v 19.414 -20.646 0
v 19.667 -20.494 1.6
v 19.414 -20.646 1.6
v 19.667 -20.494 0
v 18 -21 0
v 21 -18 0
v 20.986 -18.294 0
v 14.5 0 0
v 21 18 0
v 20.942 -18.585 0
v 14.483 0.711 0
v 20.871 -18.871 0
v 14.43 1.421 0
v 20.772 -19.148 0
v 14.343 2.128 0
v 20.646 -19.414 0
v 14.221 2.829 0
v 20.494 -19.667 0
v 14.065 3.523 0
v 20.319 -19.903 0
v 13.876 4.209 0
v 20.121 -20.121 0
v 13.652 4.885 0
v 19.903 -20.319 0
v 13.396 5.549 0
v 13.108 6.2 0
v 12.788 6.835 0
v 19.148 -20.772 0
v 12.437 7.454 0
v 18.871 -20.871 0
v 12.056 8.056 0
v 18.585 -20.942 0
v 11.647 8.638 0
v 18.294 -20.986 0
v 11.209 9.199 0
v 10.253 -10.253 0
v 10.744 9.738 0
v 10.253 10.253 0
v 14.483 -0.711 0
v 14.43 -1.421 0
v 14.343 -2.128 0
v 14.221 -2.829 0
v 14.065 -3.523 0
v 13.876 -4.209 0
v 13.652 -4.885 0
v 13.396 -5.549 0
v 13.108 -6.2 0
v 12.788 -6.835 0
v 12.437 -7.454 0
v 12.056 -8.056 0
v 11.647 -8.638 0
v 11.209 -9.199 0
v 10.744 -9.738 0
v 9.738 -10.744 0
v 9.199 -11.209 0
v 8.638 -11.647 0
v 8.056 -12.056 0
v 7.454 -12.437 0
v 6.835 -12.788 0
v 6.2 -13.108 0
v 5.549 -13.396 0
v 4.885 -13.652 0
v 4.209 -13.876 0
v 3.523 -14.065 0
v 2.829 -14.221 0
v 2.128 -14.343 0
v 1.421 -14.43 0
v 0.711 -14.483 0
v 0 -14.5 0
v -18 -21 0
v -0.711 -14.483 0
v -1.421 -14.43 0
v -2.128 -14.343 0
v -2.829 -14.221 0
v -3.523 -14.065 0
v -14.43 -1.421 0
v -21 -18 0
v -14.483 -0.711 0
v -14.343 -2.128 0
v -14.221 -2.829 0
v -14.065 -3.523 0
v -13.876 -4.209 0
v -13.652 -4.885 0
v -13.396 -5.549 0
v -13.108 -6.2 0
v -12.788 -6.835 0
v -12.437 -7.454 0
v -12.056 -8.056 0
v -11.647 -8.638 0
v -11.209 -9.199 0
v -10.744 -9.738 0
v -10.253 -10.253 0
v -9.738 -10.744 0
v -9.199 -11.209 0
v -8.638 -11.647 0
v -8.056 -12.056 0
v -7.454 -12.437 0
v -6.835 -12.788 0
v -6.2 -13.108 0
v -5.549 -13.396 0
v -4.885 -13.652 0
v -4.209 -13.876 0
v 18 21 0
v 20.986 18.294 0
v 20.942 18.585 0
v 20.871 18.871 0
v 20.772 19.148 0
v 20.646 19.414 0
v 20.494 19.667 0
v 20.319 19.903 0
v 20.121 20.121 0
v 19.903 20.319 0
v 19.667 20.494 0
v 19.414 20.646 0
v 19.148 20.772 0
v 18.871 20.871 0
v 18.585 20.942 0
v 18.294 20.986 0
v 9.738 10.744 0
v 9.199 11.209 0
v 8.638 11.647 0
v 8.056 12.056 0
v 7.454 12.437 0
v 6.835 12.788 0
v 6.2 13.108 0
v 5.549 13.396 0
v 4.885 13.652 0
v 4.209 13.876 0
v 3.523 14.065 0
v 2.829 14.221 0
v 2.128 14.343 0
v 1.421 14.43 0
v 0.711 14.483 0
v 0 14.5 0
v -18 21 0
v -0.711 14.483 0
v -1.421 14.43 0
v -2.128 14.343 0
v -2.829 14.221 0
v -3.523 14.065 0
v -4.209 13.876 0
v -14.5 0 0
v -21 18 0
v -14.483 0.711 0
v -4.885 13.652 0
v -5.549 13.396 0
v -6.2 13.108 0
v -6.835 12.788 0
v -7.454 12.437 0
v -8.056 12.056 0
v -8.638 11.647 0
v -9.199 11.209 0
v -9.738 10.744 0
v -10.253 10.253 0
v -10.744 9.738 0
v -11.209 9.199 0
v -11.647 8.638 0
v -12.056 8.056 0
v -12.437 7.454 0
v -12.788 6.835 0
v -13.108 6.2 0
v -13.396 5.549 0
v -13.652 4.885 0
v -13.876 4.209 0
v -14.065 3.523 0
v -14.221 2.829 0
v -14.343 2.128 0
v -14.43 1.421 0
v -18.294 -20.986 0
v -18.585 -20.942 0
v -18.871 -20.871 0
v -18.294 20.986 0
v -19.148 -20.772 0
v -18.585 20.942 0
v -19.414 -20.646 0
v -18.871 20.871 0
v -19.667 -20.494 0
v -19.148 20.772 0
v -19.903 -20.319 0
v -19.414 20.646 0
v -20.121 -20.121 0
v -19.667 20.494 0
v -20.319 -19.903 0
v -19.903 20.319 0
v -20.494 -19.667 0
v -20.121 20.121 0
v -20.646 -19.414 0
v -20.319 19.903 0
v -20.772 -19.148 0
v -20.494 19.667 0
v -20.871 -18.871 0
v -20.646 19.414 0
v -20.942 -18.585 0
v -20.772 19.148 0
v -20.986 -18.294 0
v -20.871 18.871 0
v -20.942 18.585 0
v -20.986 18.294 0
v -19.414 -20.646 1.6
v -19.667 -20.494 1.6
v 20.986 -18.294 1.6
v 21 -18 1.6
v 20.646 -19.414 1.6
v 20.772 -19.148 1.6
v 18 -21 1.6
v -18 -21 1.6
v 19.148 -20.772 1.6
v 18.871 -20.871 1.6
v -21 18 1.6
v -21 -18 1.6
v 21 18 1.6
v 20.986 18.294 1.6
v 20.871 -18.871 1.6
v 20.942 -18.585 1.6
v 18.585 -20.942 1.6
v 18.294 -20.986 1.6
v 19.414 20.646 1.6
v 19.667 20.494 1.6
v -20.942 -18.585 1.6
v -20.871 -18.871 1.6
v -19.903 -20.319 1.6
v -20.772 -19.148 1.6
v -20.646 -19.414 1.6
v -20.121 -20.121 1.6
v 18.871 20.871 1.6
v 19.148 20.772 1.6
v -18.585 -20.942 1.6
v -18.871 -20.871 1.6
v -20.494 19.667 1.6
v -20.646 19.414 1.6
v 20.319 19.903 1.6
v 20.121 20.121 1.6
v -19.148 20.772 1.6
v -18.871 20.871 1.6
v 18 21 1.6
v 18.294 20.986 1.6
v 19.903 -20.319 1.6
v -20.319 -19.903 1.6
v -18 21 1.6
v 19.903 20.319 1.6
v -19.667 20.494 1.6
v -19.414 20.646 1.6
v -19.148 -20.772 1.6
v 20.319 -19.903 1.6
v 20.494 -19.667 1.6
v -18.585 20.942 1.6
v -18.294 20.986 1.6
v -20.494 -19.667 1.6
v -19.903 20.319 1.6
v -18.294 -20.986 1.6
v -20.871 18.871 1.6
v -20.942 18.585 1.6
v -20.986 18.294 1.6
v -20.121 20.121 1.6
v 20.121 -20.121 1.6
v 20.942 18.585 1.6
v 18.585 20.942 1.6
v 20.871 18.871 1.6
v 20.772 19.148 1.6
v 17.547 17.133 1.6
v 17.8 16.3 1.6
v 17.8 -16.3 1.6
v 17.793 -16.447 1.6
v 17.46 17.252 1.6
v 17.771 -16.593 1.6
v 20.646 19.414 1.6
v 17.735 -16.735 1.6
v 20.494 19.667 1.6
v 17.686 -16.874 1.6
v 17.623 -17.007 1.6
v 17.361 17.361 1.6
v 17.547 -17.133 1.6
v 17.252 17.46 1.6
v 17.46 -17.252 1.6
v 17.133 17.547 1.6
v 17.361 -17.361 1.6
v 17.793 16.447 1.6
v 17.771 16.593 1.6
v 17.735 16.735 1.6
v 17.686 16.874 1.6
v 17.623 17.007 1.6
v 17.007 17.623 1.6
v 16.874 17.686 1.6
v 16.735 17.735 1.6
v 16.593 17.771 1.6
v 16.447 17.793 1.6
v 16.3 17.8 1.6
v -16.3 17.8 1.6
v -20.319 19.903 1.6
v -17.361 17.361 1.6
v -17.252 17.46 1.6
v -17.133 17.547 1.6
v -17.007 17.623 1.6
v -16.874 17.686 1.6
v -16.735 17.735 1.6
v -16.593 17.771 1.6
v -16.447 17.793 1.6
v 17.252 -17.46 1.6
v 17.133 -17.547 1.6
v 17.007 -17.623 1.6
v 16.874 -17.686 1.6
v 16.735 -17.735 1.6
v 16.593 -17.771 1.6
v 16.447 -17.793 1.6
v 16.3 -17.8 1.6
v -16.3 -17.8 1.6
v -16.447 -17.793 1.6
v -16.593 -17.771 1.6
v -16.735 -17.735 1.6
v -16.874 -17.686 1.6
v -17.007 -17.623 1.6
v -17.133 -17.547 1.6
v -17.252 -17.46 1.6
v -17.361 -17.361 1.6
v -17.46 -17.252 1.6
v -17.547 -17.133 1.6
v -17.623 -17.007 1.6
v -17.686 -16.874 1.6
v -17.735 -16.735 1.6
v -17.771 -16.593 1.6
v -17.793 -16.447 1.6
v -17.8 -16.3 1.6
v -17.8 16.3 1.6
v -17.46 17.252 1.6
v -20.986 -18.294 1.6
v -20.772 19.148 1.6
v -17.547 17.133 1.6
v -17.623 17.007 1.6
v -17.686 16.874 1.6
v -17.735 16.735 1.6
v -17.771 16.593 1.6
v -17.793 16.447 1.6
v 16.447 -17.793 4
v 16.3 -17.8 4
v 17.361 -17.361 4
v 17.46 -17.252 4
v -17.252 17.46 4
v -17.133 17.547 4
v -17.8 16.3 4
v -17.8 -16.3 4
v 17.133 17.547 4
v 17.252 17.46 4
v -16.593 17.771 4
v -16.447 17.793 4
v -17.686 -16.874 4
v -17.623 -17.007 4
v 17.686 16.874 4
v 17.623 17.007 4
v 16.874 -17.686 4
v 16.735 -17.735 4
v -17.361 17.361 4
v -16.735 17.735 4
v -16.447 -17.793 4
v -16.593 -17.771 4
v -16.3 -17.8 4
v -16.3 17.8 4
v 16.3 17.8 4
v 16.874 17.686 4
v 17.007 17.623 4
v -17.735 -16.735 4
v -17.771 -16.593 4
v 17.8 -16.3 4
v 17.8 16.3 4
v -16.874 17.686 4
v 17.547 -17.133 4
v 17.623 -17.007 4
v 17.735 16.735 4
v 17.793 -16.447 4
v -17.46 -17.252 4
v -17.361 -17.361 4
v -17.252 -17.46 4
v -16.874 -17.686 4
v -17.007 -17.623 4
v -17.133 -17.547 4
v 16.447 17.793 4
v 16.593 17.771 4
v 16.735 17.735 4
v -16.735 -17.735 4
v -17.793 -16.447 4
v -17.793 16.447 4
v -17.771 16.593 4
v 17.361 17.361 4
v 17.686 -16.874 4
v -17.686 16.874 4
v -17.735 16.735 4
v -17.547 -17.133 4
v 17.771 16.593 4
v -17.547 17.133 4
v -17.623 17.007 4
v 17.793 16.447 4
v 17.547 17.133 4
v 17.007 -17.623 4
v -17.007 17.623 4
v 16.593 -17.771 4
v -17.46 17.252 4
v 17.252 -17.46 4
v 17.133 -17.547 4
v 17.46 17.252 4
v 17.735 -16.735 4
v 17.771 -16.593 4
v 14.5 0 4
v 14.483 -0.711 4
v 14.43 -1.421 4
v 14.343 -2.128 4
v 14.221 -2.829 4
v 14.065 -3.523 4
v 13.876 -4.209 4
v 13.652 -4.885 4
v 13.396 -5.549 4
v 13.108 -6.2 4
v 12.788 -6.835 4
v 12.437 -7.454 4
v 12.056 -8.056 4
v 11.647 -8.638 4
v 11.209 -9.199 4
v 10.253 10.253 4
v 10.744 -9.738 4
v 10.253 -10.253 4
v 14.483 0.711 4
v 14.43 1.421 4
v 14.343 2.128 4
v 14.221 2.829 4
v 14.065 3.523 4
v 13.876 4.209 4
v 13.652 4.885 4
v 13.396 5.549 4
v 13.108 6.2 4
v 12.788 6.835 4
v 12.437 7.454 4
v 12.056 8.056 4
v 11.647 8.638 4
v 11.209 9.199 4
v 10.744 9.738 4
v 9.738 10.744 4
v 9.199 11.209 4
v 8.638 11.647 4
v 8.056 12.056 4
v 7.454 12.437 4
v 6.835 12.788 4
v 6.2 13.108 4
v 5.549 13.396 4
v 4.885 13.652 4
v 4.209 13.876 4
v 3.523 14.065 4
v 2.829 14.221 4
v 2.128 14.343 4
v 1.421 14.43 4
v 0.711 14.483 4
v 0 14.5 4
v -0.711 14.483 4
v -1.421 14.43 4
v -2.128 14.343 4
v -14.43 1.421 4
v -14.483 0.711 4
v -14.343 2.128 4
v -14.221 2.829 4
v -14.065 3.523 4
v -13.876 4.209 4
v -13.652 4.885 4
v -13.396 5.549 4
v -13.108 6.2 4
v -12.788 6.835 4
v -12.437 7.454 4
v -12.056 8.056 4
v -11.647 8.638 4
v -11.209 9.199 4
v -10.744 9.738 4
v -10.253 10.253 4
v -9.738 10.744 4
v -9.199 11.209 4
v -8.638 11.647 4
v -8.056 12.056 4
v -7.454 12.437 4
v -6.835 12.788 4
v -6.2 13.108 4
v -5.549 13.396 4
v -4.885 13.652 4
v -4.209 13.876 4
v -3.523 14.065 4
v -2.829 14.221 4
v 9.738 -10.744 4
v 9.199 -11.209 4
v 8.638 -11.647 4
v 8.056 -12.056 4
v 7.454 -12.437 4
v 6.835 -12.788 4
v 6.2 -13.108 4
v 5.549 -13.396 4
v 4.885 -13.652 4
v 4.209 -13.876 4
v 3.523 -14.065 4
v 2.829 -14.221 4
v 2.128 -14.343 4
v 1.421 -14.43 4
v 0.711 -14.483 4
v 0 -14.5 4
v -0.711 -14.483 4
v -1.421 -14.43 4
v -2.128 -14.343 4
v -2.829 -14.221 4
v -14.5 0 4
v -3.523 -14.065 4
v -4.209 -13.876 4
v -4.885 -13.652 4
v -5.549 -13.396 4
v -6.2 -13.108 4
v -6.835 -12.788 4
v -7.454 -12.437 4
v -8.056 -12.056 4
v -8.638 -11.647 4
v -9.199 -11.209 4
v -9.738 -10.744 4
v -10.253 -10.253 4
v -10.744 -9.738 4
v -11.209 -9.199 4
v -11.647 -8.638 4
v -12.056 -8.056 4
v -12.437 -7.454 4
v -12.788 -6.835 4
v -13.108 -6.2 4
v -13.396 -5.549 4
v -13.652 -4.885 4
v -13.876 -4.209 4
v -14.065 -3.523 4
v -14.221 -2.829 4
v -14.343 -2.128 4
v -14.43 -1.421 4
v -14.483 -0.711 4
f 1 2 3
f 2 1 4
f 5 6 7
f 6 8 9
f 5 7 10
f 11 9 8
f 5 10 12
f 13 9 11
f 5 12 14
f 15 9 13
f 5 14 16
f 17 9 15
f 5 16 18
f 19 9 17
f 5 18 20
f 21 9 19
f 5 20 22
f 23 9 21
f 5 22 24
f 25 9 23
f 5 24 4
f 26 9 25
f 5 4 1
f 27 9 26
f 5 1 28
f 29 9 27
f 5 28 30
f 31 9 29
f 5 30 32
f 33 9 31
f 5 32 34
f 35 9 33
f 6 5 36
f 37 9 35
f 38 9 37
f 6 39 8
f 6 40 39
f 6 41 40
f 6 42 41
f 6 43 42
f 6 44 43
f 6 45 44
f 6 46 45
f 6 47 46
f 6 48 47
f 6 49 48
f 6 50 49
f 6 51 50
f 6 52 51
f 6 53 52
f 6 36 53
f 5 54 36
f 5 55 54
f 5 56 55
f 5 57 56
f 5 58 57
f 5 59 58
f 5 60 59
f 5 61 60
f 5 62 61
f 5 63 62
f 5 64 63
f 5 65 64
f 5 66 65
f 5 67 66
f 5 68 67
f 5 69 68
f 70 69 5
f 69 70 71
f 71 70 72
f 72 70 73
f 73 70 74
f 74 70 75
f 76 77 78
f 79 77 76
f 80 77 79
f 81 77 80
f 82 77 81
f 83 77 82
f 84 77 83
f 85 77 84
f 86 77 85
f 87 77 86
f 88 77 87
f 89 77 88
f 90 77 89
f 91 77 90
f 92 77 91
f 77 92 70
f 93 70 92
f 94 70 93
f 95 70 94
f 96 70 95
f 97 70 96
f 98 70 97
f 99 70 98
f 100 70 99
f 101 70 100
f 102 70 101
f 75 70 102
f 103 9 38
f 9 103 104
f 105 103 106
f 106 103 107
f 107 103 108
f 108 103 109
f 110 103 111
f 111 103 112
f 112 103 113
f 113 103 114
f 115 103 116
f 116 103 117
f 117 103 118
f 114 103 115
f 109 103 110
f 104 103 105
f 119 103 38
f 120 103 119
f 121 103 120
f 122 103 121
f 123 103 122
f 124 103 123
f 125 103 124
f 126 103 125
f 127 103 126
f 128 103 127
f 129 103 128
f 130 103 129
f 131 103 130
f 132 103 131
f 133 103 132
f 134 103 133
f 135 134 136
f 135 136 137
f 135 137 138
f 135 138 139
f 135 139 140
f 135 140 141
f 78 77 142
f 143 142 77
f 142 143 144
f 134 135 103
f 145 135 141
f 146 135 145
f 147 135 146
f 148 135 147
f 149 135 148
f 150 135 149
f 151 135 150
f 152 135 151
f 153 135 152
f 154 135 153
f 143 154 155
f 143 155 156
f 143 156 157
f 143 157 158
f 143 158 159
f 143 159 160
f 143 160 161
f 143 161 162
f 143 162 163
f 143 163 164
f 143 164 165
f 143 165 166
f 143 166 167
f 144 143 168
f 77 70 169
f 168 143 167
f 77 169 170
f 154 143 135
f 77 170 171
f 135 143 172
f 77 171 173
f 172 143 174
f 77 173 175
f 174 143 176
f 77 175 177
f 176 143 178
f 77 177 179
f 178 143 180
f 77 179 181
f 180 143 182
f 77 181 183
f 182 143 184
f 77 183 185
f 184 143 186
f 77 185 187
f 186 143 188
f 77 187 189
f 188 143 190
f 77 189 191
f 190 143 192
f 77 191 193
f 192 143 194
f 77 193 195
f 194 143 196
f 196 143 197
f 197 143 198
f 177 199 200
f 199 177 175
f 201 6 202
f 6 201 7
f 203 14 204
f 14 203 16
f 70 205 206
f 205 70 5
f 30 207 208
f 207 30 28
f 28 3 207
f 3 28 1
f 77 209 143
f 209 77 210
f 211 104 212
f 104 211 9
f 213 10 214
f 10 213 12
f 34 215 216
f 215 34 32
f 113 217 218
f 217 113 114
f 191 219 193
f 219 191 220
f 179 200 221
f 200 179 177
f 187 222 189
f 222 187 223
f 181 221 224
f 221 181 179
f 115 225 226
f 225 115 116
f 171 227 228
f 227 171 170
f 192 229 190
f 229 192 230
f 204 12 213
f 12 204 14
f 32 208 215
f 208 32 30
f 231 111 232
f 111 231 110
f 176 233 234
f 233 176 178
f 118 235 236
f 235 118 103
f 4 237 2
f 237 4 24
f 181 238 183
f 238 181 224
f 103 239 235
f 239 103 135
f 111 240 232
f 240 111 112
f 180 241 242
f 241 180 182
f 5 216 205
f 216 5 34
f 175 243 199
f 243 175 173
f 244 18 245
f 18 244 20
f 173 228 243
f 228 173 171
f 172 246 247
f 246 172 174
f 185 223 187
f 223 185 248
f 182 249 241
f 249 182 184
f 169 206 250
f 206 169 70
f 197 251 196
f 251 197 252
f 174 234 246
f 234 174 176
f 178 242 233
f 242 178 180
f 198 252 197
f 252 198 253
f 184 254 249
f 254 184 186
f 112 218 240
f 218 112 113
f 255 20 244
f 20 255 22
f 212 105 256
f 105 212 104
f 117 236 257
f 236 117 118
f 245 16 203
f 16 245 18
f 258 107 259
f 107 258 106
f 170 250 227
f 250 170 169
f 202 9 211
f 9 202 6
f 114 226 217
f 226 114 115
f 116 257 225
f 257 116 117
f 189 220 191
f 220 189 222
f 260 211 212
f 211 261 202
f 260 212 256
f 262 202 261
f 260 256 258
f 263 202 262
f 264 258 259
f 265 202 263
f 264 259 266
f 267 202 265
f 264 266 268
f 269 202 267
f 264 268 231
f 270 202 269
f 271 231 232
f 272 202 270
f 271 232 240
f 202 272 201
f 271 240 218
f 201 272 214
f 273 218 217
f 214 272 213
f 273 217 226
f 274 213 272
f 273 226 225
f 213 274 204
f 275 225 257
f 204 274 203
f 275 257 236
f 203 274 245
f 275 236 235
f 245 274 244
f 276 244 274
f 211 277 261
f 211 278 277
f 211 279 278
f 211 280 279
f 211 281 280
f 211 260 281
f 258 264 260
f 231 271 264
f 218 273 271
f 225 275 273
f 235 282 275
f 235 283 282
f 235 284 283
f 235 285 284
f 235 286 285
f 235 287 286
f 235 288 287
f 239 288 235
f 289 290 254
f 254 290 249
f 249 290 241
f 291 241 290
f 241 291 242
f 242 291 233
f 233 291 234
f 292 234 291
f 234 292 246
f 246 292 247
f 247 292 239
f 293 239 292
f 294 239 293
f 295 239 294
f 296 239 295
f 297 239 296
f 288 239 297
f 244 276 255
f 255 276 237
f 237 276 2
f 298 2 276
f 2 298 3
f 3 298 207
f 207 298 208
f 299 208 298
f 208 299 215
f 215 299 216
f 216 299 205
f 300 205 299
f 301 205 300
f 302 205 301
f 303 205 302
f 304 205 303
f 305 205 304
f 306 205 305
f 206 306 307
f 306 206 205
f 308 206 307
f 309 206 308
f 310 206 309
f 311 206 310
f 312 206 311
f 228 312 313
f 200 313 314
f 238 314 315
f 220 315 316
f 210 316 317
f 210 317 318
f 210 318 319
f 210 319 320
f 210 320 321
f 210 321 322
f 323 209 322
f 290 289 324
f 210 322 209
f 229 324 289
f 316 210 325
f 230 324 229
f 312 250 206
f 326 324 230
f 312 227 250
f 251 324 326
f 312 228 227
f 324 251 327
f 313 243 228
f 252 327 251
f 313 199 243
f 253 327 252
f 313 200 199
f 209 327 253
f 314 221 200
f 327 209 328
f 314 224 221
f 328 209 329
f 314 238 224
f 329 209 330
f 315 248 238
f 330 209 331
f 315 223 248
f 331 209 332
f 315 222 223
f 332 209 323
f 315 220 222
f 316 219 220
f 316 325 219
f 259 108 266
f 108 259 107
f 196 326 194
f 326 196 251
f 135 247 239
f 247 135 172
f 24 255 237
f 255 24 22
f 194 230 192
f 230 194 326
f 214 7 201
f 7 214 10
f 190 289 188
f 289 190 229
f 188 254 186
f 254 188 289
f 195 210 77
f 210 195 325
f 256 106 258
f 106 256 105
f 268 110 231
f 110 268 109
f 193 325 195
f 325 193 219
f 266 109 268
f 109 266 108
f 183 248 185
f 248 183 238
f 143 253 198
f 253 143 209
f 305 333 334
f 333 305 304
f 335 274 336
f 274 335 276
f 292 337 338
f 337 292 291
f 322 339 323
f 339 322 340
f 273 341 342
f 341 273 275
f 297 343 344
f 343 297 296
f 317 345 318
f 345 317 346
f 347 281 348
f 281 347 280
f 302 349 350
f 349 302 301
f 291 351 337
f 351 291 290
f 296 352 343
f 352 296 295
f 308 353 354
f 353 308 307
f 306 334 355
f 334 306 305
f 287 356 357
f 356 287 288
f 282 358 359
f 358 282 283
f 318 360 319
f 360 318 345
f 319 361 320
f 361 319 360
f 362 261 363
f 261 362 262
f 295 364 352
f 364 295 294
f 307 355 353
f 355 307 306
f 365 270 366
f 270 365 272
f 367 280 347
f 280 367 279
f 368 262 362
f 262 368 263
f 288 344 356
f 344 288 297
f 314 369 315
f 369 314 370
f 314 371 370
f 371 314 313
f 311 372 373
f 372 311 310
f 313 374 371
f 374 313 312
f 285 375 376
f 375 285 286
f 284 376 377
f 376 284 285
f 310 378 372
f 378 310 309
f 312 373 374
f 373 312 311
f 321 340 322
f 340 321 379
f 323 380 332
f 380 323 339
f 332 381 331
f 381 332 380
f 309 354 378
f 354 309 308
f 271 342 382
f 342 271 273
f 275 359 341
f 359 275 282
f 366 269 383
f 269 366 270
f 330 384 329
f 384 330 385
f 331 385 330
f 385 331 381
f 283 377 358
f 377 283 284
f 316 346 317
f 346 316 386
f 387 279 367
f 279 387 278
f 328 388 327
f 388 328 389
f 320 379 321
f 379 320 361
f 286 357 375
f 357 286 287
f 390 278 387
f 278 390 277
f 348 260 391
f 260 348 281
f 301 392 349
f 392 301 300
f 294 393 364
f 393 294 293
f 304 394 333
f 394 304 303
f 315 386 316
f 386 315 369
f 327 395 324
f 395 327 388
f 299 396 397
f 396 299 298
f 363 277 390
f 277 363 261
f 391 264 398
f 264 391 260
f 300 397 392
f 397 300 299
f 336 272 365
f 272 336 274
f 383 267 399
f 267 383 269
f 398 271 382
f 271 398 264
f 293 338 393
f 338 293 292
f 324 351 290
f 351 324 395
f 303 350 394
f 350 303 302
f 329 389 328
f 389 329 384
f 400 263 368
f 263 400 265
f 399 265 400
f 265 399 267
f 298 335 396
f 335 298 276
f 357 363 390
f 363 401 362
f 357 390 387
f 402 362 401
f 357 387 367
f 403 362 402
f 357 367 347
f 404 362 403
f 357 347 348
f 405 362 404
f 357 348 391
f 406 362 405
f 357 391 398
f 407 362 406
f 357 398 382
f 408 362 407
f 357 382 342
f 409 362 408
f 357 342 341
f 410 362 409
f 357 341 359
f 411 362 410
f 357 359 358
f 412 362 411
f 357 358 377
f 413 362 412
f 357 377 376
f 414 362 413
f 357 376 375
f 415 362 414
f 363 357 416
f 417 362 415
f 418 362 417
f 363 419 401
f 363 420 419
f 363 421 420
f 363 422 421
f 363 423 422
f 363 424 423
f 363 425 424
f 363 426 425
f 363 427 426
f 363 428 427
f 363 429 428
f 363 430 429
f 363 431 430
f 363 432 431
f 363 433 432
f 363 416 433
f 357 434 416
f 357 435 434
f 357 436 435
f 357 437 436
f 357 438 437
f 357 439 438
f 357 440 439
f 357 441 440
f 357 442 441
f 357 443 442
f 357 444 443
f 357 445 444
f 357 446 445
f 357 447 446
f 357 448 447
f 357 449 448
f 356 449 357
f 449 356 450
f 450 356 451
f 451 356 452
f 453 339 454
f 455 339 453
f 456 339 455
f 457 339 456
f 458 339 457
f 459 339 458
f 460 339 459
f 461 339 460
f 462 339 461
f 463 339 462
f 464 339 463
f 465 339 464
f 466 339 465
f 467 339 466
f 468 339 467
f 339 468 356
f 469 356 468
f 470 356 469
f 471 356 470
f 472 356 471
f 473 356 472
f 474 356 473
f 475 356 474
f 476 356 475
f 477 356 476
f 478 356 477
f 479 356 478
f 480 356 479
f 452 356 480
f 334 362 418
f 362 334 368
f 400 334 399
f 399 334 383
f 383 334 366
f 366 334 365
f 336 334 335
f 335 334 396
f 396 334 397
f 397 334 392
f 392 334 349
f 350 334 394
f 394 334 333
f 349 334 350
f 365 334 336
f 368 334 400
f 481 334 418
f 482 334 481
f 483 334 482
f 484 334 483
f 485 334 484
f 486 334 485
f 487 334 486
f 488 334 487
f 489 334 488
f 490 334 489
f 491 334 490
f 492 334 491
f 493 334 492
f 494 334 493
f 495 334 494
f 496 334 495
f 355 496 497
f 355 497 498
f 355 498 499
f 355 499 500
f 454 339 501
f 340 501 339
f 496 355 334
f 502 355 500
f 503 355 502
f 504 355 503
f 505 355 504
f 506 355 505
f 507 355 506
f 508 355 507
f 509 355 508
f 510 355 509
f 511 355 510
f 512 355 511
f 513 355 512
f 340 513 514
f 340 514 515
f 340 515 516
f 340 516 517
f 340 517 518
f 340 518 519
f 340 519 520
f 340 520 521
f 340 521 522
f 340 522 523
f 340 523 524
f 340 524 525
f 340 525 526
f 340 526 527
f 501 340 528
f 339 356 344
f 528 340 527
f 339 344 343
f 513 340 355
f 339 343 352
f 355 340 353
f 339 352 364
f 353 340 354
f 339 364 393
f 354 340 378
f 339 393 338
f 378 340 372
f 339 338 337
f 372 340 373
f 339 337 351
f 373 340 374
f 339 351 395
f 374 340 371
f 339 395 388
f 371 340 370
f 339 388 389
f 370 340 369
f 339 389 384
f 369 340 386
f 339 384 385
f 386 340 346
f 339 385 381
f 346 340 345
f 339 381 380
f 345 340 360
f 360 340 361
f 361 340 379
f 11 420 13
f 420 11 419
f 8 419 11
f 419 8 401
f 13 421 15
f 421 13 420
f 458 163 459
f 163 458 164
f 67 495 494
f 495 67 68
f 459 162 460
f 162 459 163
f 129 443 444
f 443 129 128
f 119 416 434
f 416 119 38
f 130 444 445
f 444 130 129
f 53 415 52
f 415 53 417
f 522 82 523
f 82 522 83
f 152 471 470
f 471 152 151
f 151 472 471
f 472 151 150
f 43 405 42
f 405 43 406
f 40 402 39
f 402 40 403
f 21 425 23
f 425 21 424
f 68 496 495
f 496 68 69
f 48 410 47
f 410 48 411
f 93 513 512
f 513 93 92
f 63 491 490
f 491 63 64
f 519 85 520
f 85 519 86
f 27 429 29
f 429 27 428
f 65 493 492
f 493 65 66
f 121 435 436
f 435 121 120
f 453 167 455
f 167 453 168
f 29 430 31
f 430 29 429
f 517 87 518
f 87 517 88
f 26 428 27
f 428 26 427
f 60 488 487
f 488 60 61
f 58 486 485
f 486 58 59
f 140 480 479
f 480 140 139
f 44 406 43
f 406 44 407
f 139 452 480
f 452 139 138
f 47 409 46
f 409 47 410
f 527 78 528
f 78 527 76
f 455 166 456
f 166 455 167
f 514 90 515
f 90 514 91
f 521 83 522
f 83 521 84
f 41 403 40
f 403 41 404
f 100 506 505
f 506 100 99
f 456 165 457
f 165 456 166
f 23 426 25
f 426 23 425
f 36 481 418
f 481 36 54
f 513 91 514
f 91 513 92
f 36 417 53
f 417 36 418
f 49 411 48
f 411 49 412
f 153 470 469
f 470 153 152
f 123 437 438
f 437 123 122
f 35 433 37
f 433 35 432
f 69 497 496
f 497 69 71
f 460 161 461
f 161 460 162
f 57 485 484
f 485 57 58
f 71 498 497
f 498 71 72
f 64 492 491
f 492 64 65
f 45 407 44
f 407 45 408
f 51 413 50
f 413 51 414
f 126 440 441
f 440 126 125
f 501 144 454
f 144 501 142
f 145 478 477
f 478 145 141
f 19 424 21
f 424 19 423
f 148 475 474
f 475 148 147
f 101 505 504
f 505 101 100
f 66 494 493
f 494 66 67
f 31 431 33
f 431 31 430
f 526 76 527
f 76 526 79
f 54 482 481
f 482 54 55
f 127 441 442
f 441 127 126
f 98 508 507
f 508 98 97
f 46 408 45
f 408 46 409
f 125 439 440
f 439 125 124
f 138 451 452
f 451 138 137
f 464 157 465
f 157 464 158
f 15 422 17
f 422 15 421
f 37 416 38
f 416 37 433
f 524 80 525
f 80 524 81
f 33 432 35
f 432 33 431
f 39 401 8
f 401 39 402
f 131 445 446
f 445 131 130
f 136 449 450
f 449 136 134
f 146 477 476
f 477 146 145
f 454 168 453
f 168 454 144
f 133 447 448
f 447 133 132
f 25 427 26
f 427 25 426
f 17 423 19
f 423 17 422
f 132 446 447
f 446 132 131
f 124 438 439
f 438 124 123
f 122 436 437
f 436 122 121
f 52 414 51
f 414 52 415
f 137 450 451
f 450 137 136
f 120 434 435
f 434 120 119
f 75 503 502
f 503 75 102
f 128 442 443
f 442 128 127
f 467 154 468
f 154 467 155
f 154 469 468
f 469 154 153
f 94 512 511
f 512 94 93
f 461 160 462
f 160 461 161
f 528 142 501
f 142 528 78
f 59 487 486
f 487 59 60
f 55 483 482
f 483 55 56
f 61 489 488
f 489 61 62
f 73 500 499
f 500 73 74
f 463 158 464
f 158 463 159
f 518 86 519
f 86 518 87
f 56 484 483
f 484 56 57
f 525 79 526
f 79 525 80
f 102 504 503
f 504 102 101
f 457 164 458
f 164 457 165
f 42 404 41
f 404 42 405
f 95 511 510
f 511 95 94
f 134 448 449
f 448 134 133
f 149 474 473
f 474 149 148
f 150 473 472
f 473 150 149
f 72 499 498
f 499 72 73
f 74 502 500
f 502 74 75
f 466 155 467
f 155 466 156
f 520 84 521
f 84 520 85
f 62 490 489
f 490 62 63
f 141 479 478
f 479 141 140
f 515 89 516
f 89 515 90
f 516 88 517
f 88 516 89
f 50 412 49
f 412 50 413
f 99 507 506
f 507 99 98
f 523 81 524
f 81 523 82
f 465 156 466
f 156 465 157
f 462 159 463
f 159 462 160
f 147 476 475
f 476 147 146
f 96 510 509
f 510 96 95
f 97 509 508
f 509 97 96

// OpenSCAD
// file: params.scad
// BubbleLink printed parts: shared measurements and fit settings.
//
// Every model in this folder includes this file. Edit a value here, re-run
// build.sh, and every affected STL is regenerated.
//
// Each value is tagged with where it came from:
//   [VERIFIED]  datasheet, PCB release package, or canonical-facts.md
//   [LISTING]   seller listing claim; plausible but not measured
//   [ESTIMATE]  nobody has measured it; MEASURE THE PART before a long print
//
// All dimensions in mm.

$fn = 64;

// ---------------------------------------------------------------- printing
fit_clear   = 0.30;   // clearance per side for a part dropping into a pocket
slide_clear = 0.20;   // clearance per side for the slide-clamp dovetail
ziptie_w    = 3.2;    // slot width for the narrow zip ties on hand
ziptie_t    = 1.8;    // slot thickness

// ---------------------------------------------------------------- 18650 cells
cell_d      = 18.33;  // [VERIFIED] Samsung INR18650-25R, +/-0.07
cell_h      = 64.85;  // [VERIFIED] +/-0.15
cell_bore   = 18.80;  // pocket diameter; tune with fit_coupon (18.65/18.80/18.95)
cell_pitch  = 19.90;  // centre-to-centre. Gives a ~1.6 mm wrapper gap and a
                      // printable 1.1 mm rib. Keep <= 21 so the 26 mm nickel
                      // tabs still reach both cell centres.
holder_t    = 10.0;   // spacer thickness along the cell axis
holder_lip  = 2.0;    // retaining lip under each cell end
holder_wall = 2.4;    // outer wall around the cell group
cap_window  = 12.5;   // opening in the lip for spot-welding the tabs

// ---------------------------------------------------------------- tubing
tube_od     = 5.5;    // [VERIFIED order] 3.5 ID x 5.5 OD silicone
tube_wall   = 1.0;
tube_flat_w = 8.8;    // width of the tube when pinched flat (pi*OD/2 + margin)

// ---------------------------------------------------------------- connectors
// AMASS XT30U / XT60H housings. Datasheet-nominal; tune with fit_coupon.
xt30_w      = 10.2;   // [ESTIMATE] across the housing
xt30_h      =  5.3;   // [ESTIMATE]
xt60_w      = 16.0;   // [ESTIMATE] XT60H with sheath
xt60_h      =  8.4;   // [ESTIMATE]

// ---------------------------------------------------------------- umbilical
awg16_od    = 3.2;    // [ESTIMATE] 16 AWG silicone insulation OD
awg12_od    = 4.0;    // [ESTIMATE] 12 AWG silicone insulation OD
usb_od      = 4.0;    // [ESTIMATE] LED-backpack USB cable OD
pump_od     = 2.0;    // [ESTIMATE] G528 motor lead insulation OD
paracord_d  = 4.0;    // [LISTING] 550 cord, 4 mm

// ---------------------------------------------------------------- PCB
// [VERIFIED] BubbleLink CTRL v1.2: 50 x 40 x 1.6 mm, NPTH H1-H4 3.2 mm at
// (+/-21.5, +/-16.5) from board centre.
pcb_w       = 50.0;
pcb_h       = 40.0;
pcb_hole_dx = 43.0;
pcb_hole_dy = 33.0;
pcb_hole_d  = 3.2;
pcb_standoff = 6.0;   // board underside height above the tray
// main file
// Port inserts for the dry core's 36 mm square ports. Each one is a quick
// print, so a wrong guess about an unmeasured part costs one small reprint,
// not the box or lid. Push in from outside and glue (CA or hot glue).
//
//   type = "voltmeter"  round hole for the Stlxy voltmeter (lid)
//   type = "breaker"    finger hole over the breaker's reset (lid)
//   type = "usbc"       USB-C window, offset 10 mm toward the floor. Its plug
//                       has chamfered top corners like the wall port, so it
//                       only fits one way (arrow toward the back plate). Seat the receptacle
//                       in the window, set the charger on a spacer, and
//                       zip-tie it to the floor grid; glue alone won't hold
//                       against plugging in (right wall)
//   type = "blank"      closes an unused port
//
// Print flange-down, PETG, no supports.

include <params.scad>

type = "voltmeter";

port = 36;           // must match dry_core.scad
wall = 2.4;          // lid / wall thickness
flange = 1.6;

vm_hole   = 29.0;    // [ESTIMATE] MEASURE the voltmeter body behind its
                     // 33.8 mm bezel and set this 0.4 mm larger
brk_hole  = 30.0;    // [ESTIMATE] big enough for a fingertip on the reset
usb_win   = [9.8, 4.0];    // through-window for the plug's metal shell
usb_cbore = [13.5, 7.5];   // outside counterbore for the plug overmold
usb_web   = 0.8;           // material left at the window, so the plug seats
usb_dz    = -10;           // window offset toward the floor (see the arrow)

module rsq(s, r) { offset(r) square([s[0] - 2 * r, s[1] - 2 * r], center = true); }

// must match port_profile() in dry_core.scad
module port_profile(s = port, ch = 11) {
    polygon([[-s / 2, -s / 2], [s / 2, -s / 2], [s / 2, s / 2 - ch],
             [s / 2 - ch, s / 2], [-s / 2 + ch, s / 2], [-s / 2, s / 2 - ch]]);
}

difference() {
    union() {
        linear_extrude(flange) rsq([port + 6, port + 6], 3);
        if (type == "usbc")   // wall port: chamfered top, same as the box
            linear_extrude(flange + wall) offset(-0.2) port_profile();
        else
            linear_extrude(flange + wall) rsq([port - 0.4, port - 0.4], 1.5);
    }
    if (type == "voltmeter")
        translate([0, 0, -1]) cylinder(d = vm_hole, h = 10, $fn = 128);
    if (type == "breaker")
        translate([0, 0, -1]) cylinder(d = brk_hole, h = 10, $fn = 128);
    if (type == "usbc") translate([0, usb_dz, 0]) {
        translate([0, 0, -1]) linear_extrude(10) rsq(usb_win, 1.6);
        translate([0, 0, -1]) linear_extrude(flange + wall - usb_web + 1) rsq(usb_cbore, 2.5);
    }
    // arrow on the outside face: point it at the floor (toward the back plate)
    if (type == "usbc")
        translate([0, 9, -0.01]) mirror([1, 0, 0]) linear_extrude(0.6)
            polygon([[-1, 8], [1, 8], [1, 3], [3, 3], [0, 0], [-3, 3], [-1, 3]]);
}
